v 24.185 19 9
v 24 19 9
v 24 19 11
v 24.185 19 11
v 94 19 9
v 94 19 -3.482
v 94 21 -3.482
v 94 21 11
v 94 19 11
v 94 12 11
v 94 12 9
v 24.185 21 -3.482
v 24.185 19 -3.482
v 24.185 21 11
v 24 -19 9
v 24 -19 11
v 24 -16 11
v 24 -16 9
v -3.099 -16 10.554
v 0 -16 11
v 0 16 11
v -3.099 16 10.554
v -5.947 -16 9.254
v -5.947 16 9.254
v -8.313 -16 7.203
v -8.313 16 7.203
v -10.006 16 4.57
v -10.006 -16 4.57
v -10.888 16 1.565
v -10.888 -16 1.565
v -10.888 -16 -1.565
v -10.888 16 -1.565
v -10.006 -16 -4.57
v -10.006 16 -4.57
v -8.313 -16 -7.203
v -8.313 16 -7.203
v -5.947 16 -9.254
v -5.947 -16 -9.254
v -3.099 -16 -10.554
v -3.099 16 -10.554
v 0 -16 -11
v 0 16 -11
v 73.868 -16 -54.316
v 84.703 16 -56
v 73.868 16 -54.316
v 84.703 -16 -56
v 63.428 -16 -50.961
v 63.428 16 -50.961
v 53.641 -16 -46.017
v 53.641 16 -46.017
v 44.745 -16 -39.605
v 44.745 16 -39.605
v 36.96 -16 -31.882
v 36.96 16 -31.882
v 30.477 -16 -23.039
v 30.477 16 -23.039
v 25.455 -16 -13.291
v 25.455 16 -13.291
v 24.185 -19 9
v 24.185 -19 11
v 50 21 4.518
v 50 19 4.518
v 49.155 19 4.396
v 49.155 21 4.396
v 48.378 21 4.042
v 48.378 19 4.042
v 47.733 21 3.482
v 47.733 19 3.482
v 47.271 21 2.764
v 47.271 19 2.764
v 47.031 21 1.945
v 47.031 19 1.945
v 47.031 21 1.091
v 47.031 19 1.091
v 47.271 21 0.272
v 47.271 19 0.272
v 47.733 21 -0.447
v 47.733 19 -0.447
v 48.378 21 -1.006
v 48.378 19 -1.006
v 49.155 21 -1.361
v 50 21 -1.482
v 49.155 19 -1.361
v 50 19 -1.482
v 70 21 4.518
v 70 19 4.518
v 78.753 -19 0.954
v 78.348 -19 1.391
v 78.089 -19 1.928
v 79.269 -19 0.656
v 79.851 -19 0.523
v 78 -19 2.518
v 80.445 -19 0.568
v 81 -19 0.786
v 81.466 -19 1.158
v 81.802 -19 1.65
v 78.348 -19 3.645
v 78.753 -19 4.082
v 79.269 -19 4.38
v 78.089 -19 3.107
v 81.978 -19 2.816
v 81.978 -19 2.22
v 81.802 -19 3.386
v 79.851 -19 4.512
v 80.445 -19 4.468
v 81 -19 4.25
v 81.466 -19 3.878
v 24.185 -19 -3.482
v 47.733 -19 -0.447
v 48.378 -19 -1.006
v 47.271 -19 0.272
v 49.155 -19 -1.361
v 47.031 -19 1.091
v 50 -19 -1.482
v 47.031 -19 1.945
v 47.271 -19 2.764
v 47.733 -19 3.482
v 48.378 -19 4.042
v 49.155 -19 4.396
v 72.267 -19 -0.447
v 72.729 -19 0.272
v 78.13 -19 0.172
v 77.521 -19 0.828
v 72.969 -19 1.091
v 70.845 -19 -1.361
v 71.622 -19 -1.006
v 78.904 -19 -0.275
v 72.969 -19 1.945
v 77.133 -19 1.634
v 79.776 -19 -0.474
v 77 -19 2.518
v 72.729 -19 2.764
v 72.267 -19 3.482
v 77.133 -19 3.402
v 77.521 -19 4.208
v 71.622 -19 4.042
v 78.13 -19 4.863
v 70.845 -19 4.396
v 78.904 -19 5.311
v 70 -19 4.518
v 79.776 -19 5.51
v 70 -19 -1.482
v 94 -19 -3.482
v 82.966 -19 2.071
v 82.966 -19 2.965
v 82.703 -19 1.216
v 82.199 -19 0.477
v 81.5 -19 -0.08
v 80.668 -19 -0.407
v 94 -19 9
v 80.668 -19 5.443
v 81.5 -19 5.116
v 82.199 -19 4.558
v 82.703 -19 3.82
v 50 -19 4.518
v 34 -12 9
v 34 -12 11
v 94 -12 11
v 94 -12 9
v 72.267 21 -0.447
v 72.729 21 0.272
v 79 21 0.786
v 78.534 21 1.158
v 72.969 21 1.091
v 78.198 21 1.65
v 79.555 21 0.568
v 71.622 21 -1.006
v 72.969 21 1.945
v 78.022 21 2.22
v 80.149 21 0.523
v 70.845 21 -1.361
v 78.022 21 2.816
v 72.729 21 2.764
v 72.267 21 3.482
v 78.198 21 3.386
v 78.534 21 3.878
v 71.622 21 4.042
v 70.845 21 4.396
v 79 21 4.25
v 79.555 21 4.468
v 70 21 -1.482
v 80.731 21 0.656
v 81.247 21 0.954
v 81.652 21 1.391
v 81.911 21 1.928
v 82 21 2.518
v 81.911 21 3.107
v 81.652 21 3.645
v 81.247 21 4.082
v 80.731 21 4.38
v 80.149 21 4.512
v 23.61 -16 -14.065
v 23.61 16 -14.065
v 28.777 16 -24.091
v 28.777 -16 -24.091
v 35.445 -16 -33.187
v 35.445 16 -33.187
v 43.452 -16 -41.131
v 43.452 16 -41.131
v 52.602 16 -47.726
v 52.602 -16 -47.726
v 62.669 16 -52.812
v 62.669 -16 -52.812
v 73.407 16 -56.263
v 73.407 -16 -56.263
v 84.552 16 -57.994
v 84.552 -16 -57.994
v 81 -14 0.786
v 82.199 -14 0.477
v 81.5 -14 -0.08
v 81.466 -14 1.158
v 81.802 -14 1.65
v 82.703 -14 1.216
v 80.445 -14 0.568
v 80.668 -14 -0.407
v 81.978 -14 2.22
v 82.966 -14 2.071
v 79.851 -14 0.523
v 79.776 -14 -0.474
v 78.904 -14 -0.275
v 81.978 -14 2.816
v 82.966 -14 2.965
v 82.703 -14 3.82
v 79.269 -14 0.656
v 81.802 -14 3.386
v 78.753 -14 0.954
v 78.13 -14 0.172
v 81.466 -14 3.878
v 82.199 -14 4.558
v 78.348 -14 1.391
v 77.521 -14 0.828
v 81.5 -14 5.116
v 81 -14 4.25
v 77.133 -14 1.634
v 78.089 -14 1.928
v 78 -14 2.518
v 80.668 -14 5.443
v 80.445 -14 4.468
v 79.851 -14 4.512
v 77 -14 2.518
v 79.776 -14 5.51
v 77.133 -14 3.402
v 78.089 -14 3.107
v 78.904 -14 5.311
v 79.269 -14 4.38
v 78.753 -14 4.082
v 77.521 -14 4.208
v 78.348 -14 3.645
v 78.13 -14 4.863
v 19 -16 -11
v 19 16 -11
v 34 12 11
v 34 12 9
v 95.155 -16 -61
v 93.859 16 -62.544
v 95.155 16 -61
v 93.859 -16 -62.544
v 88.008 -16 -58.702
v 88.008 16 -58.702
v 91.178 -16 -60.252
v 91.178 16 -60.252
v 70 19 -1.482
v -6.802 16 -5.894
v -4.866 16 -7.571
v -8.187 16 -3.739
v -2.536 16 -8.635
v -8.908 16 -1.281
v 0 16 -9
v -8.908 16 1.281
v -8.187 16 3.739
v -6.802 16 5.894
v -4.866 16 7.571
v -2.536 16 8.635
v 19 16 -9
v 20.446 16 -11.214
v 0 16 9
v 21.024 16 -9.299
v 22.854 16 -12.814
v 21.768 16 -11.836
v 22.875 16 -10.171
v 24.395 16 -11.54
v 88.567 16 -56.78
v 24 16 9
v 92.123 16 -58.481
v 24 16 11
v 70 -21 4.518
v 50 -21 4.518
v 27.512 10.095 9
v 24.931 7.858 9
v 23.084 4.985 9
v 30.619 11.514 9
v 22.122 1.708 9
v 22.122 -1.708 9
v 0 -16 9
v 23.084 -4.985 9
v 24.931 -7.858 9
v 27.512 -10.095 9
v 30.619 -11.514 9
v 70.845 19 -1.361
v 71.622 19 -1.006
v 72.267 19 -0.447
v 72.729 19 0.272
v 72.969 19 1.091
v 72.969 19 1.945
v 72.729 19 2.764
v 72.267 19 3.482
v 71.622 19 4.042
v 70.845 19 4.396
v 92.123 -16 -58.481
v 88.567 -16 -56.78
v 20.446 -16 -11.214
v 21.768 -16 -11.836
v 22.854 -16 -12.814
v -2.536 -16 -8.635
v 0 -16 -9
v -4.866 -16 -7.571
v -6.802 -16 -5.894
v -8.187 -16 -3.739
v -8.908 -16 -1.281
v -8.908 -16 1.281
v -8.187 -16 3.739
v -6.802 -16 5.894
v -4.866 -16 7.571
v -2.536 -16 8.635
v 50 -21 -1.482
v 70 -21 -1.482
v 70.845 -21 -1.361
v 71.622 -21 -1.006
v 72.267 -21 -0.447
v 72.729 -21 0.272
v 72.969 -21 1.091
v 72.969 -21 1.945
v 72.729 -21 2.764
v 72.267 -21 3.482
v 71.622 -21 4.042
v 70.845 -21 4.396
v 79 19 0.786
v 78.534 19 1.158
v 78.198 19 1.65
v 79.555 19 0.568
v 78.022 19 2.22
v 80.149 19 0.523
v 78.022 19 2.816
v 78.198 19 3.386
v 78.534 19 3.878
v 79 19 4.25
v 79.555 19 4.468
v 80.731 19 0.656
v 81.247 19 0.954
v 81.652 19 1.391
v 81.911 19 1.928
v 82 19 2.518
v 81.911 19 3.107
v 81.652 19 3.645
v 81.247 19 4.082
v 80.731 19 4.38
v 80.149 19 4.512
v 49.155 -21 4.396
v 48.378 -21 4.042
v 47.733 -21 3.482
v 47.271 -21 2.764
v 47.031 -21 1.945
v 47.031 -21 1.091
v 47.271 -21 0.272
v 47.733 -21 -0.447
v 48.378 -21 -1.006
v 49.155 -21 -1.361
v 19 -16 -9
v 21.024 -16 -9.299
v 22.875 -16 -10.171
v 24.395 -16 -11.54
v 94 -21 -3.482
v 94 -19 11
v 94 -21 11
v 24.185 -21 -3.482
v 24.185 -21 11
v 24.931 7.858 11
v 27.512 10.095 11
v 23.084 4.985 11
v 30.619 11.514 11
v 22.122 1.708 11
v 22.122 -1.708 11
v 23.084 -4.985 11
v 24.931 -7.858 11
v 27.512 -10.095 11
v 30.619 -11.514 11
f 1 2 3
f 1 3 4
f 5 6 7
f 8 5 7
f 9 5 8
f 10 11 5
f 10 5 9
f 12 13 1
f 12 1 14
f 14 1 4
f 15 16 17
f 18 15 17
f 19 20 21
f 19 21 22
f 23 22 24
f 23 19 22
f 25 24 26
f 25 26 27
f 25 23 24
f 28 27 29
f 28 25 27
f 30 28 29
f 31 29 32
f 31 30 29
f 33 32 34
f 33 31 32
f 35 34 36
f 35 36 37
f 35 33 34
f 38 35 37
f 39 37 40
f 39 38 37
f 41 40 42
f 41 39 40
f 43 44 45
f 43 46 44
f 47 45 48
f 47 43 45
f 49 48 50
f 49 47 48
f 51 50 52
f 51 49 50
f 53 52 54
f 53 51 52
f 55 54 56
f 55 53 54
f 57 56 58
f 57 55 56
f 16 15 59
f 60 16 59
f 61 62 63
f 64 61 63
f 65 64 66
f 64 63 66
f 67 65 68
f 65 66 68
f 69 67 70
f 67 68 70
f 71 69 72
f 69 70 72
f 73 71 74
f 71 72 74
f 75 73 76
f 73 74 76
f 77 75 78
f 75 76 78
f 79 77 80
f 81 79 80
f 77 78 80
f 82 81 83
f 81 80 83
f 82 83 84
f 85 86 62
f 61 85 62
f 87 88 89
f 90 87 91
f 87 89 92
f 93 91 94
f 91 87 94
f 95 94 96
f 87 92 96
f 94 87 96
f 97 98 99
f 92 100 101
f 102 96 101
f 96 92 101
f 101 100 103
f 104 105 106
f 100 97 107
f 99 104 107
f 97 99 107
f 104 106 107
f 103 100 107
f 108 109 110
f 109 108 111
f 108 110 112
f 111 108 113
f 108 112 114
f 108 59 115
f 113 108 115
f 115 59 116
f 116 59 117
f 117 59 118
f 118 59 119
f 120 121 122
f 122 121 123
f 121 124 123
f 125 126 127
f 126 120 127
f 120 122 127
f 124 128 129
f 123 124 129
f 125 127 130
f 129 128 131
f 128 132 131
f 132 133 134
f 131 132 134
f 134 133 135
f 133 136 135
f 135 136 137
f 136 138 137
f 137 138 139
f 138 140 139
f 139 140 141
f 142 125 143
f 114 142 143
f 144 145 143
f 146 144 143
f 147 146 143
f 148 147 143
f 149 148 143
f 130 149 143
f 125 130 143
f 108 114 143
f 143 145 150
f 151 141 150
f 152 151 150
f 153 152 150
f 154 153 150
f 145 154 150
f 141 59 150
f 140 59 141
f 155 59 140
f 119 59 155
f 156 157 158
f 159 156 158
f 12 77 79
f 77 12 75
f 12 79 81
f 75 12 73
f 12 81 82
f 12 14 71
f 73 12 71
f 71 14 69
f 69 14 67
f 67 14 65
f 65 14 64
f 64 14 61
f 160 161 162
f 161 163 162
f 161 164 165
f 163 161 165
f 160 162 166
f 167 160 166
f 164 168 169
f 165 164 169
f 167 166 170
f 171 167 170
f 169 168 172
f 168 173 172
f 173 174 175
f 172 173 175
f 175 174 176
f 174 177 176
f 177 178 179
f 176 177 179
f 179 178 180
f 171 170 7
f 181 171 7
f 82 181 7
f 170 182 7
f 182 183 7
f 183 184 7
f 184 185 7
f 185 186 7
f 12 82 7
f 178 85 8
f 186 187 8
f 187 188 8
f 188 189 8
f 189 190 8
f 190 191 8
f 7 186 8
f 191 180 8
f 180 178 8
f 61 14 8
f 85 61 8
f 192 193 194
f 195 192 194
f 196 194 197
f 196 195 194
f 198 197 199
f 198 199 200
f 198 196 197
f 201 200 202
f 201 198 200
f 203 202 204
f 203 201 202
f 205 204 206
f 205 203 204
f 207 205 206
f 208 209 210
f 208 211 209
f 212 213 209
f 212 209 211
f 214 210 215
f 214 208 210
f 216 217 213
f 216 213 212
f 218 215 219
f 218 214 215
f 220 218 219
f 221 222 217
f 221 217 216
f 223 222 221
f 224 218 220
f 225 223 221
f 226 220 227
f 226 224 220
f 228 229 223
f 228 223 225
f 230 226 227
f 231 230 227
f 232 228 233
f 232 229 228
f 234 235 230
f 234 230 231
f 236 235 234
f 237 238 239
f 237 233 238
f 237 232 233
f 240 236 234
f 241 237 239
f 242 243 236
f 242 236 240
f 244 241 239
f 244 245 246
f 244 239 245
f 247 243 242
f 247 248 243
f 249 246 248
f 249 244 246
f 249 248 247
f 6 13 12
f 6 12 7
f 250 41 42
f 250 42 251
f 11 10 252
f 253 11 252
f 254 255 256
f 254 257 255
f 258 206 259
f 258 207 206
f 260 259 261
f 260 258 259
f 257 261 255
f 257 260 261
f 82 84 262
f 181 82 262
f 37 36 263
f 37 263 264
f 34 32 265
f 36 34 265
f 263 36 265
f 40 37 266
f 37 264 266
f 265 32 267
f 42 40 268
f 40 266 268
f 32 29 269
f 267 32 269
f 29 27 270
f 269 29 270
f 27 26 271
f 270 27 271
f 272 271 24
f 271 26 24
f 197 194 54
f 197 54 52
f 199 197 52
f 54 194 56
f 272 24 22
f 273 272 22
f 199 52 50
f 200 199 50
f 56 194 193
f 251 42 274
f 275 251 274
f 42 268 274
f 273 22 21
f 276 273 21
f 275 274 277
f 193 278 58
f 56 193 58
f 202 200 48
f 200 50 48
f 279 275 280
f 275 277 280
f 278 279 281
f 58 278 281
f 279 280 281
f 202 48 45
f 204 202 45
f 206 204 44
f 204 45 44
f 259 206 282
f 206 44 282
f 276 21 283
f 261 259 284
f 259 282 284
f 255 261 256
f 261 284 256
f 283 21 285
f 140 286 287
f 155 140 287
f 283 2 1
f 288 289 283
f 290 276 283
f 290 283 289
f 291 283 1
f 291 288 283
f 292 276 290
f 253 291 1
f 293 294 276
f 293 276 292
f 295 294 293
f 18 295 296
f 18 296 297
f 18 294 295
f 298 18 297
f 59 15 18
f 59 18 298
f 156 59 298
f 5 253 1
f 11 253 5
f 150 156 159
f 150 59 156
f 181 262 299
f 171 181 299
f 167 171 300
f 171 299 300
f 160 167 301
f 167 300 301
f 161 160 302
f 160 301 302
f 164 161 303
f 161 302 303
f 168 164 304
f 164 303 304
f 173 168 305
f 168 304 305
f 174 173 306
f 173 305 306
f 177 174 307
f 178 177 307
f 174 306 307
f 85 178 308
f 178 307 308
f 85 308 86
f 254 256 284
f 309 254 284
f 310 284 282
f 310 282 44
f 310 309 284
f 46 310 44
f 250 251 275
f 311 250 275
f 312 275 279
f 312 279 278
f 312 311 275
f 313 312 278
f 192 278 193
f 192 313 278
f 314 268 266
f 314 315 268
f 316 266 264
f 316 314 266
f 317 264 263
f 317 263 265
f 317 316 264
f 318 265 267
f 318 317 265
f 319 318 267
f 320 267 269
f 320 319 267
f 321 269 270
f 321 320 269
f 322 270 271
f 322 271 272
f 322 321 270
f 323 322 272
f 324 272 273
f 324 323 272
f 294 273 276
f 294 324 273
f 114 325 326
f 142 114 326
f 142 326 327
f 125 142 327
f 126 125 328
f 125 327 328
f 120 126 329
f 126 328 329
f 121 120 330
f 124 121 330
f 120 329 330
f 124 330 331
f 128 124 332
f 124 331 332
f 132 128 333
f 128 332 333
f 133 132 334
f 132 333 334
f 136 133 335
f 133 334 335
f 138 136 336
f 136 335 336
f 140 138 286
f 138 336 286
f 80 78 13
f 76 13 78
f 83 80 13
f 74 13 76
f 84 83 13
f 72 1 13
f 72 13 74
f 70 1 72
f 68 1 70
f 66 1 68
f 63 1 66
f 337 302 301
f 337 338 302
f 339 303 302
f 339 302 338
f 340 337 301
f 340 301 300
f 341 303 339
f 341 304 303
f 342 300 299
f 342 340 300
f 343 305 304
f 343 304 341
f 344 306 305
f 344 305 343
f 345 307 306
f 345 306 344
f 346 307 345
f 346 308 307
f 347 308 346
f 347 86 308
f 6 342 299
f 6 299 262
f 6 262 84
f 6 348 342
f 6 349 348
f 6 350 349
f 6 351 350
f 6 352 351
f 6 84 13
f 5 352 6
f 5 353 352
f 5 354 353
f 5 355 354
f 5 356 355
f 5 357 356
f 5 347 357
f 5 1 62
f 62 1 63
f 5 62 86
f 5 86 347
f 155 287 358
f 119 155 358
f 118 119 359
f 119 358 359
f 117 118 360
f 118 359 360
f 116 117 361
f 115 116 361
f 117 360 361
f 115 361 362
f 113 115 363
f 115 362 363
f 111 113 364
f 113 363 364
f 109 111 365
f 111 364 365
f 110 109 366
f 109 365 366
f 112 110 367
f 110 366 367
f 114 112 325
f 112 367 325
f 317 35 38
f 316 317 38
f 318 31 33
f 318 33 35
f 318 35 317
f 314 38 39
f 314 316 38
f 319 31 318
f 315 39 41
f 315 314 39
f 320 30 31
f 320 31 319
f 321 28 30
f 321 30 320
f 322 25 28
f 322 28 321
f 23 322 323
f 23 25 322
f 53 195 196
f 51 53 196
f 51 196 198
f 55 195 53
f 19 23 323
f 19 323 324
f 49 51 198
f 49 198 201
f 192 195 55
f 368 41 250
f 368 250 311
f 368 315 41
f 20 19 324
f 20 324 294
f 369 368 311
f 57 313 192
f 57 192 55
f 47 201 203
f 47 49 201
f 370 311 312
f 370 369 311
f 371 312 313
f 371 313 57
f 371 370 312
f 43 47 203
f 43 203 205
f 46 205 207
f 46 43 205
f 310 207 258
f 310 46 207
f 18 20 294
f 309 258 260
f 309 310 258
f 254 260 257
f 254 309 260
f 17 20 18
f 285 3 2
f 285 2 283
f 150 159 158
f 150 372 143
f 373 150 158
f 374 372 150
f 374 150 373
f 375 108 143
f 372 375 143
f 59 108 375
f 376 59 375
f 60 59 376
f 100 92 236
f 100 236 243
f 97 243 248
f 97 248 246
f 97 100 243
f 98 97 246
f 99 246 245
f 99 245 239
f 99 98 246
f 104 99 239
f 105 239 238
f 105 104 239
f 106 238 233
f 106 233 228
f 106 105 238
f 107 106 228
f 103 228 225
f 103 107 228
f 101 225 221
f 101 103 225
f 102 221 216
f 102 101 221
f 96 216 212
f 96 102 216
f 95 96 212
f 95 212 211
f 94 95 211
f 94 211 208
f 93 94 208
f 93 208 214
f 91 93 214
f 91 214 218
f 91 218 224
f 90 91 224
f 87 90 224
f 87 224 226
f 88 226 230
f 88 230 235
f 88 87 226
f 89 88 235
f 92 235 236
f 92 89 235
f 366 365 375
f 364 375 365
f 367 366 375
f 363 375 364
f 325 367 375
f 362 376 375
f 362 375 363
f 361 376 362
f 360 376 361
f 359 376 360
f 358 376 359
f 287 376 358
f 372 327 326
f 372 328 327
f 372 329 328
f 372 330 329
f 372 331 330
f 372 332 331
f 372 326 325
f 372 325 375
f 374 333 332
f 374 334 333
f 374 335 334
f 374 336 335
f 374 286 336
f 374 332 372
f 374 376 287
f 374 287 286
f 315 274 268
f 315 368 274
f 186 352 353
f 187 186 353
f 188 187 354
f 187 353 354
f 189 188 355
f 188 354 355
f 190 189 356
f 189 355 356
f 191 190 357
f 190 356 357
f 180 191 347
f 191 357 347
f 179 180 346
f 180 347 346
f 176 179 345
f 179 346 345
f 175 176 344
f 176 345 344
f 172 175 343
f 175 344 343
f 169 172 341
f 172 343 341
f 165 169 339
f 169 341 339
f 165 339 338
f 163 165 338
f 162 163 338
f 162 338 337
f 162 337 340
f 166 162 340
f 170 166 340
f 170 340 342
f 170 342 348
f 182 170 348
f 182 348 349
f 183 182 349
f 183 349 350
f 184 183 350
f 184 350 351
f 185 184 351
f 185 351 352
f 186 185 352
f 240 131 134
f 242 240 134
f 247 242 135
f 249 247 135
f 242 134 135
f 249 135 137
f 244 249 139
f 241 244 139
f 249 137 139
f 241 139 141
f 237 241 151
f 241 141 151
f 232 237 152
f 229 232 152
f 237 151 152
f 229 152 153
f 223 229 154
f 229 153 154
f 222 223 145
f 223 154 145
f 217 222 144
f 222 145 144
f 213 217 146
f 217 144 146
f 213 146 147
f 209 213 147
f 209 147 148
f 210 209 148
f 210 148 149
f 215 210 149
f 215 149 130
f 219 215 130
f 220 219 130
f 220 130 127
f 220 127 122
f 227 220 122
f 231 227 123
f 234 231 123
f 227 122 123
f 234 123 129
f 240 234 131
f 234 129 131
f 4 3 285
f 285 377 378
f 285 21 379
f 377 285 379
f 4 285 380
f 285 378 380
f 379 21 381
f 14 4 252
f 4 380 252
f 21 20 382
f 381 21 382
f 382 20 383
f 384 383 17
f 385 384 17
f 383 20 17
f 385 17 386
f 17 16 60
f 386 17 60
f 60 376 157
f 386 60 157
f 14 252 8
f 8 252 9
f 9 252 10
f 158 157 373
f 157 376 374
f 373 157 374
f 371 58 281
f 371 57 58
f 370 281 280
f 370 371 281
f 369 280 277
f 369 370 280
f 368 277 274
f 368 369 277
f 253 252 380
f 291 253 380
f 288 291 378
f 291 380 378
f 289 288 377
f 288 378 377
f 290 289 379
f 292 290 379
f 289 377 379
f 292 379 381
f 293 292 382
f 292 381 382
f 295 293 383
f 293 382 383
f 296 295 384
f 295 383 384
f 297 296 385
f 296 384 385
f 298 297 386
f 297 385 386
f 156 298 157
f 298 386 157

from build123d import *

# Parameters (mm, degrees)
F1_DEPTH  = 16
F3_W      = 70
F3_H      = 3
F4_DEPTH  = 2
F5_W      = 69.8145667315
F5_H      = 14.4820966907
F6_DEPTH  = 2
F9_DEPTH  = 2
F11_DEPTH = 42.001
F13_D     = 4
F13_DEPTH = 21.001
F14_R     = 3
F14_R_2   = 2
F15_DEPTH = 5


with BuildPart() as f1:
    # F0 (on Front) → F1 (new body)
    with BuildSketch(Plane.XZ):
        with BuildLine():
            Line((94, 11), (0, 11))
            ThreePointArc((0, 11), (-11, 0), (0, -11))
            Line((0, -11), (19, -11))
            ThreePointArc((19, -11), (21.7681124643, -11.8361612201), (23.6103896104, -14.064978646))
            ThreePointArc((23.6103896104, -14.064978646), (47.8977113224, -44.6078392712), (84.5520957277, -57.9942665386))
            ThreePointArc((84.5520957277, -57.9942665386), (89.6419160729, -59.3768457194), (93.8590048523, -62.5444881493))
            Line((93.8590048523, -62.5444881493), (95.1549842887, -61))
            ThreePointArc((95.1549842887, -61), (90.3976747979, -57.5207528796), (84.7034264019, -56))
            ThreePointArc((84.7034264019, -56), (49.0672193413, -42.9854179344), (25.4545454545, -13.2909701044))
            ThreePointArc((25.4545454545, -13.2909701044), (22.87535745, -10.1706257081), (19, -9))
            Line((19, -9), (0, -9))
            ThreePointArc((0, -9), (-9, 0), (0, 9))
            Line((0, 9), (94, 9))
            Line((94, 9), (94, 11))
        make_face()
    extrude(amount=F1_DEPTH)

    # F3 (on face) → F4 (join)
    with BuildSketch(Plane.XY.offset(11)):
        with Locations((59, -17.5)):
            Rectangle(F3_W, F3_H)
    extrude(amount=-F4_DEPTH)

    # F5 (on face) → F6 (join)
    with BuildSketch(Plane.XZ.offset(19)):
        with Locations((59.0927166343, 3.7589516547)):
            Rectangle(F5_W, F5_H)
    extrude(amount=F6_DEPTH)

    # F7: F1 across face


with BuildPart() as f1_1:
    add(f1.part)
    add(f1.part.mirror(Plane.XZ))

    # F8 (on face) → F9 (cut)
    with BuildSketch(Plane.XY.offset(11)):
        with BuildLine():
            Line((94, 12), (34, 12))
            ThreePointArc((34, 12), (22, 0), (34, -12))
            Line((34, -12), (94, -12))
            Line((94, -12), (94, 12))
        make_face()
    extrude(amount=-F9_DEPTH, mode=Mode.SUBTRACT)

    # F10 (on face) → F11 (cut, through all)
    with BuildSketch(Plane.XZ.offset(21)):
        with BuildLine():
            ThreePointArc((50, 4.5179033093), (47, 1.5179033093), (50, -1.4820966907))
            Line((50, -1.4820966907), (70, -1.4820966907))
            ThreePointArc((70, -1.4820966907), (73, 1.5179033093), (70, 4.5179033093))
            Line((70, 4.5179033093), (50, 4.5179033093))
        make_face()
    extrude(amount=-F11_DEPTH, mode=Mode.SUBTRACT)

    # F13 (through all, one way)
    with BuildSketch(Plane.XZ):
        with Locations((80, 2.5179033093)):
            Circle(F13_D / 2)
    extrude(amount=-F13_DEPTH, mode=Mode.SUBTRACT)

    # F14 (on face) → F15 (join)
    with BuildSketch(Plane(origin=(0, -19, 0), x_dir=(-1, 0, 0), z_dir=(0, 1, 0))):
        with Locations((-80, 2.5179033093)):
            Circle(F14_R)
        with Locations((-80, 2.5179033093)):
            Circle(F14_R_2, mode=Mode.SUBTRACT)
    extrude(amount=F15_DEPTH)


solid = f1_1.part
